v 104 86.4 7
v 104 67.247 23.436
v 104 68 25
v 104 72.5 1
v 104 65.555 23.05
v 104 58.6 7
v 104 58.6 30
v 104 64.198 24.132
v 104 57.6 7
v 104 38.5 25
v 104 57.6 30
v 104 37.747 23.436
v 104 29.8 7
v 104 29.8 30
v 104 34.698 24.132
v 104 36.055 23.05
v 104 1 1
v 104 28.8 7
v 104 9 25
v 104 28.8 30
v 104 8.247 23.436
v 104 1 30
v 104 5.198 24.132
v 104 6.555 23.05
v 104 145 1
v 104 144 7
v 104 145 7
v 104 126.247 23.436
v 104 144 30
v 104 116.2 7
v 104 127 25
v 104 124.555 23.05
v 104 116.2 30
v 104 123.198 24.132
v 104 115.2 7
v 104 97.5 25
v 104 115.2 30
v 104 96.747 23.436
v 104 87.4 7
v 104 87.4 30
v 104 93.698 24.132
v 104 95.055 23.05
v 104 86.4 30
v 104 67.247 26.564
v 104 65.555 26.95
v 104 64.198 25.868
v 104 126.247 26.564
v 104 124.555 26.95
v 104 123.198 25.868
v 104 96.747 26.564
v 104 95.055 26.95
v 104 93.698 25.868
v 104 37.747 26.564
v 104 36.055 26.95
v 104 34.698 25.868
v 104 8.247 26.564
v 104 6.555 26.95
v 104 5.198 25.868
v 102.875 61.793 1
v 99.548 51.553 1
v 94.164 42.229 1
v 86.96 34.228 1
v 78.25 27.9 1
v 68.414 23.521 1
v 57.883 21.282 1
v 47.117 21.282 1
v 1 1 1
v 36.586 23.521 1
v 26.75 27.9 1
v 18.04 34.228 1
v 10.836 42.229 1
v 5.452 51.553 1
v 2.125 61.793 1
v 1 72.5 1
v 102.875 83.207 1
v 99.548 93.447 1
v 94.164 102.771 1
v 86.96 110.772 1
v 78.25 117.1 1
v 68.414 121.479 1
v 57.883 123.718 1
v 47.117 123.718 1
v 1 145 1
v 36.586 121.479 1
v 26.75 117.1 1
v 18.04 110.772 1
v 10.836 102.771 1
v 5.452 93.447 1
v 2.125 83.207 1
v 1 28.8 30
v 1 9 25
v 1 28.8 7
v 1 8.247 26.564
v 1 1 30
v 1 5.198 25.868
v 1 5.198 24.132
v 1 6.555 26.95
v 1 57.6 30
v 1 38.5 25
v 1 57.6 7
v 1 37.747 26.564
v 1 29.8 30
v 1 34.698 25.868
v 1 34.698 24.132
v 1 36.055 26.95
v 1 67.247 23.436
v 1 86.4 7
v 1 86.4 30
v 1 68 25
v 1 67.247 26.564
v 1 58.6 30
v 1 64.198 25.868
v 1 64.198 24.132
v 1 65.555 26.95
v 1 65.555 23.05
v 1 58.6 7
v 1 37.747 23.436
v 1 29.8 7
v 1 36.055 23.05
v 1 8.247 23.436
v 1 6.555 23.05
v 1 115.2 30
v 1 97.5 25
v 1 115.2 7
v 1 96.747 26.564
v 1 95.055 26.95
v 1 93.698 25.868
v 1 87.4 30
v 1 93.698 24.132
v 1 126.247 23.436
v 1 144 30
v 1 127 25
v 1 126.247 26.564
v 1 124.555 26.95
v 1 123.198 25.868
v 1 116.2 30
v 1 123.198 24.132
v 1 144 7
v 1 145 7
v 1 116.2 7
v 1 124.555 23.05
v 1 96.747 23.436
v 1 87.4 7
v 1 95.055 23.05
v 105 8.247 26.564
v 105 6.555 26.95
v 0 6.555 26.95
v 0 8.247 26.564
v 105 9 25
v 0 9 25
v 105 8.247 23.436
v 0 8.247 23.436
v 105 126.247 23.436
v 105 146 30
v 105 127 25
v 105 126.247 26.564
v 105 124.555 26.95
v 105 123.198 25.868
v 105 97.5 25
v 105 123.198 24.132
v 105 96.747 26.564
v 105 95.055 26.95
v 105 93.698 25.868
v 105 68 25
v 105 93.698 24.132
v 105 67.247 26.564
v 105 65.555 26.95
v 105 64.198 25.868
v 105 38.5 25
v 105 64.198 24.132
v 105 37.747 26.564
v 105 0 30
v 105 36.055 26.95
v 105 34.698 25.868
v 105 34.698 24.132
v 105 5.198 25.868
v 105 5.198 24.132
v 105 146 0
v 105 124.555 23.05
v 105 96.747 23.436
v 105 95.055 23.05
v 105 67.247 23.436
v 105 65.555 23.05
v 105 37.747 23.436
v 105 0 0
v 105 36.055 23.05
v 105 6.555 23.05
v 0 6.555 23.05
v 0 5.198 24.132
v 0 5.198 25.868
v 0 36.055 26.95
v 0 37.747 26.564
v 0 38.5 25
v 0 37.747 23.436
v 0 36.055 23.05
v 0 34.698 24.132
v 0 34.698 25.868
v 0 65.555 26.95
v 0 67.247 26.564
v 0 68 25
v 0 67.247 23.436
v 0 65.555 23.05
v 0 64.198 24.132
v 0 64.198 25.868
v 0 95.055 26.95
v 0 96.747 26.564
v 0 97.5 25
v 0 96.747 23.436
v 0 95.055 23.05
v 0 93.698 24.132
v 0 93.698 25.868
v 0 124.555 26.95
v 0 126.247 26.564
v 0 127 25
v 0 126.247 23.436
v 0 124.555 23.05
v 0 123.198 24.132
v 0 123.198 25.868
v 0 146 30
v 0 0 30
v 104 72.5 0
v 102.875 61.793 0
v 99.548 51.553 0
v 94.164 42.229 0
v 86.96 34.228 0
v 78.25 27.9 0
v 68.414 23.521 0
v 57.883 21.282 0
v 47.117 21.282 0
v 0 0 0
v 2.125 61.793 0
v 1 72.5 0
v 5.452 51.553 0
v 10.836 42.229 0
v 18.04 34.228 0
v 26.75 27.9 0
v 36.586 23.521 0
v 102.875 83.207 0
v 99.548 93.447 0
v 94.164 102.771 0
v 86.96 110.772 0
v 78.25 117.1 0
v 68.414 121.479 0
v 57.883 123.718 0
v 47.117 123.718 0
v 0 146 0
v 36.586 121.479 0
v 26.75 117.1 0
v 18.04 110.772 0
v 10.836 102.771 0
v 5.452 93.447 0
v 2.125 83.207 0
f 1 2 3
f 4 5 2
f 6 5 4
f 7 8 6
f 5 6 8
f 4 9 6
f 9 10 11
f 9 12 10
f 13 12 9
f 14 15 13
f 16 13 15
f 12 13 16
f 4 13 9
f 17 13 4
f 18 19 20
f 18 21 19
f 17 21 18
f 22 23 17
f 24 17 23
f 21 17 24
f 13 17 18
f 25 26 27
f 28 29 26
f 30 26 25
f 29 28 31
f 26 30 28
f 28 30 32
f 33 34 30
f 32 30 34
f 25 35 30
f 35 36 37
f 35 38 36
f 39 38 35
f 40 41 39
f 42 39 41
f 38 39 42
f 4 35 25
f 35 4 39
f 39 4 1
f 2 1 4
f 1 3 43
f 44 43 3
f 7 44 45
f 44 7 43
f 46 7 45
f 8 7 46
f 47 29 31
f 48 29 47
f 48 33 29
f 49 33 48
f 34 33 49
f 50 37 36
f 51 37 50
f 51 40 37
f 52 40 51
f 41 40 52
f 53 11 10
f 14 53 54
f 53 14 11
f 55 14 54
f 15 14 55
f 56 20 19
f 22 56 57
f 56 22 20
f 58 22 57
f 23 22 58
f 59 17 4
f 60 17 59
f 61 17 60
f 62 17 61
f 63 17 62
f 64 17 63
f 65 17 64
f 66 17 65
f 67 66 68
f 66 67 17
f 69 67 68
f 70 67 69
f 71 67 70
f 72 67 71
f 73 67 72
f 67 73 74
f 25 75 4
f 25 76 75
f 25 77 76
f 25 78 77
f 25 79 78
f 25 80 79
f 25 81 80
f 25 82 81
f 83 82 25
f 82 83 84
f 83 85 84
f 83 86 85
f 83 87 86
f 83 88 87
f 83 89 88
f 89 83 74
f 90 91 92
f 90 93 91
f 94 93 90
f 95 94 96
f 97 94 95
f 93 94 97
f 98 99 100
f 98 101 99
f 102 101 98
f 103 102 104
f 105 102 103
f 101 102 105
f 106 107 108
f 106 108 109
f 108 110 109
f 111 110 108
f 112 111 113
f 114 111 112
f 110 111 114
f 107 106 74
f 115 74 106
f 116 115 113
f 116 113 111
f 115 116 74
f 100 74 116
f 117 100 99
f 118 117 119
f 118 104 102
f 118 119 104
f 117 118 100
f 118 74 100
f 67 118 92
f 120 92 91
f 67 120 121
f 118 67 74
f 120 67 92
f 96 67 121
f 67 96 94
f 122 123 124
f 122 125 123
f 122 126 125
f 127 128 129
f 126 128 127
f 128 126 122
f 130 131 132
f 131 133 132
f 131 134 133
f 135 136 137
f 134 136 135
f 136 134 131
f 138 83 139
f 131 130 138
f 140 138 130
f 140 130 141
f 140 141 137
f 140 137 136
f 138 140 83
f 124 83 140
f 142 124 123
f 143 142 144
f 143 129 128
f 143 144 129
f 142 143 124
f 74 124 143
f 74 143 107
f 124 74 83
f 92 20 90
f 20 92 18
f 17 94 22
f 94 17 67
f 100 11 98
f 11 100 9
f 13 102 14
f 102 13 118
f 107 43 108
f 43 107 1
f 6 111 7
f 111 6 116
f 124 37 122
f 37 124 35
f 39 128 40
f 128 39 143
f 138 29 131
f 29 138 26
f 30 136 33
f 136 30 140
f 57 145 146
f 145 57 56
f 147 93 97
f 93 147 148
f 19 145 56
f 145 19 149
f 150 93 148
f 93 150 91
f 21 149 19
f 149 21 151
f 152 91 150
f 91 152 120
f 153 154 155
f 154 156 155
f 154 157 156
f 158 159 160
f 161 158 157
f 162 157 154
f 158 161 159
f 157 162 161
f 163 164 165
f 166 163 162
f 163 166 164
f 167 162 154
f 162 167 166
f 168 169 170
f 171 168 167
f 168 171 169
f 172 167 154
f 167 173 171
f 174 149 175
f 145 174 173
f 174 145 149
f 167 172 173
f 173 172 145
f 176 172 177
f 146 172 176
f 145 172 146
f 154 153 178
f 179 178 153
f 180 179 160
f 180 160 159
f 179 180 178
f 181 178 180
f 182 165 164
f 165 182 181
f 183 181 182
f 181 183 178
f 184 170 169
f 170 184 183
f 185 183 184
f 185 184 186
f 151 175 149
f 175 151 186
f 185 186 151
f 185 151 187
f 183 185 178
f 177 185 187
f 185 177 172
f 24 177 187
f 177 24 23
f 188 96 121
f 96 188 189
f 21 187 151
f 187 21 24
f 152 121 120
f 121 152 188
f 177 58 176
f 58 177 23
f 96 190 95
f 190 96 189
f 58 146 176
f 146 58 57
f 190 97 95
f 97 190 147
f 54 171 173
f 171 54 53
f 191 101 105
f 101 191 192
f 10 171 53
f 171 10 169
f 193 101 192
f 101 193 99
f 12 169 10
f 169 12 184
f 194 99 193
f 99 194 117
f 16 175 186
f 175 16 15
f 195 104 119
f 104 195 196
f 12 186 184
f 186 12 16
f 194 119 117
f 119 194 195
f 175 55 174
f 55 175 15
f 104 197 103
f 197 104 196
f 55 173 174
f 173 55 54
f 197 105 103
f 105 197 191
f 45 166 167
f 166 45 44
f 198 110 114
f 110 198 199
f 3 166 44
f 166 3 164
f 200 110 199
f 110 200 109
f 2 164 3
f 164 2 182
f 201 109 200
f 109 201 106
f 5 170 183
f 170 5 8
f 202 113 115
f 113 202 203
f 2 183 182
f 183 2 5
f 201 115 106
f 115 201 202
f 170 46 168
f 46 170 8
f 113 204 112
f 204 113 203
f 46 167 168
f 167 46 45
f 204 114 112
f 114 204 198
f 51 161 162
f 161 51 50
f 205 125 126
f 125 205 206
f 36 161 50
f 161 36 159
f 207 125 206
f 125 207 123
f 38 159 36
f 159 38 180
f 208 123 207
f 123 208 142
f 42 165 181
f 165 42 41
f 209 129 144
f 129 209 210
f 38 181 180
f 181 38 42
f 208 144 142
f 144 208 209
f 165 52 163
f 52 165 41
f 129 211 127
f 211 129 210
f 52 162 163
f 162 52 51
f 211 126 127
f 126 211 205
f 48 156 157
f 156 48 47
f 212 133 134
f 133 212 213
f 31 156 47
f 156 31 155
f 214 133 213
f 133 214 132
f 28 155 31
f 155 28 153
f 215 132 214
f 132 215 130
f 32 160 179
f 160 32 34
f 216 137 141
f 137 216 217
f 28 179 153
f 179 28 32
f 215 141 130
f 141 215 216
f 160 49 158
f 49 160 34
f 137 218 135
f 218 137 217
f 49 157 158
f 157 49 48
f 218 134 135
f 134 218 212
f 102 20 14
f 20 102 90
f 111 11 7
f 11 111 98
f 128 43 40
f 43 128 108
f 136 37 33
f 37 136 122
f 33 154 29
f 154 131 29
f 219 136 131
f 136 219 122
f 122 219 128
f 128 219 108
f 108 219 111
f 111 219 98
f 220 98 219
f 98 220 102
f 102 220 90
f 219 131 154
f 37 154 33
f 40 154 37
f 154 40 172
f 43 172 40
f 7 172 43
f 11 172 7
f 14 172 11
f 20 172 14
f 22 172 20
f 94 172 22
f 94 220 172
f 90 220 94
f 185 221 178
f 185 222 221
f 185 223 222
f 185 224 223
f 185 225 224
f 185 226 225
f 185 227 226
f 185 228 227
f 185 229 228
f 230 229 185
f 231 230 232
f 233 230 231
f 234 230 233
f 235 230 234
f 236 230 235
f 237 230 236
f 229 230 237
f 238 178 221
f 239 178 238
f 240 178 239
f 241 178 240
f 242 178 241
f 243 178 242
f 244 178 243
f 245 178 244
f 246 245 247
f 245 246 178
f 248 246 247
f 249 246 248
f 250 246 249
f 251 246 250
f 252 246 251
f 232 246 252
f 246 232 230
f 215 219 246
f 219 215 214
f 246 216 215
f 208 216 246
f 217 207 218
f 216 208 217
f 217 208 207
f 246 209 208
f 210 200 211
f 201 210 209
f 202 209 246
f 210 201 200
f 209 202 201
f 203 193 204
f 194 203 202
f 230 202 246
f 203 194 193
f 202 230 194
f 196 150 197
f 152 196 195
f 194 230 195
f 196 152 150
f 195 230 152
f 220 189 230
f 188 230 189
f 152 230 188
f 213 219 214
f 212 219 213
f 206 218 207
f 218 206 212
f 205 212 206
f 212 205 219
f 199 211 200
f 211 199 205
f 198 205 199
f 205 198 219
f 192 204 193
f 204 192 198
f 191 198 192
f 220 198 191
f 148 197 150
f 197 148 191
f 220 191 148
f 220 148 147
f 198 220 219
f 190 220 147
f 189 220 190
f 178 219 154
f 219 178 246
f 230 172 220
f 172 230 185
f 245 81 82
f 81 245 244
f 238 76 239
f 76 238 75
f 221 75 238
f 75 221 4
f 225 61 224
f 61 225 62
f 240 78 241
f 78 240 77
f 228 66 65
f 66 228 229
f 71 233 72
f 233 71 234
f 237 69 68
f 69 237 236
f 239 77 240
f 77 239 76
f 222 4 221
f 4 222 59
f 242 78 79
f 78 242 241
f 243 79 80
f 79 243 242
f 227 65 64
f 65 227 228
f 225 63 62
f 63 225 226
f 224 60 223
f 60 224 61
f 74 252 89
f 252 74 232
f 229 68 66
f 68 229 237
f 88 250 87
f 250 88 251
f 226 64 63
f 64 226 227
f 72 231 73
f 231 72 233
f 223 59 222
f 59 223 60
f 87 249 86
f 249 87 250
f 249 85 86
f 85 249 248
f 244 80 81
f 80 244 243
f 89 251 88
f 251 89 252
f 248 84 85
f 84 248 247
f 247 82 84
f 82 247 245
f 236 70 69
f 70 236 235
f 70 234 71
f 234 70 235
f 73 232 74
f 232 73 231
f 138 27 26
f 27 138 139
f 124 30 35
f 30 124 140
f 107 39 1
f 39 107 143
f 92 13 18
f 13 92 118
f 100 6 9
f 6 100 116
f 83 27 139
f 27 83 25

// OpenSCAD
thickness=1;


iw=103;
ow=iw+(2*thickness);
il=144;
ol=il+(2*thickness);
h=30; // Just for testing
hdlen=144/5; //this should be equal to il/5

screw_r=2;
screw_offset=thickness+6;
screw_delta=29.5;

xs=8;
ys=4.7;


difference() {
// outside cube
cube([iw+(thickness*2),il+(thickness*2),h]);

// inside cubes
for(hd=[1:hdlen:hdlen*5]) {
translate([thickness,hd,1])
       cube([iw,hdlen-thickness,h+2]);
}

// fan hole
translate([ow/2,20+ow/2,-1])
    cylinder(r=iw/2,h=thickness+2);
//translate([8,8,-1]) cylinder(r=2.25,h=4,center=false);
//translate([8,113,-1]) cylinder(r=2.25,h=4,center=false);
//translate([113,8,-1]) cylinder(r=2.25,h=4,center=false);
//translate([113,113,-1]) cylinder(r=2.25,h=4,center=false);

// gap
translate([1,1,1])
    cube([iw,il,6]);

// screw holes
for(x=[screw_offset:screw_delta:screw_delta*6]){
    rotate([90,0,90])
        translate([x,h-5,-2])
            cylinder(r=screw_r,h=iw+4,center=false);
}
}



//difference() {
//cube([ow,ol,thickness]);
//translate([ow/2,20+ow/2,-1]) cylinder(r=iw/2,h=thickness+2);
//translate([8,8,-1]) cylinder(r=2.25,h=4,center=false);
//translate([8,113,-1]) cylinder(r=2.25,h=4,center=false);
//translate([113,8,-1]) cylinder(r=2.25,h=4,center=false);
//translate([113,113,-1]) cylinder(r=2.25,h=4,center=false);
//}

// grill
//for(x=[0:xs*2:120]){
//for(y=[0:ys*2:120]){
//translate([x+0,y+0,-1]) cylinder(r=5,h=4,$fn=6,center=false);
//translate([x+xs,y+ys,-1]) cylinder(r=5,h=4,$fn=6,center=false);
//}}
